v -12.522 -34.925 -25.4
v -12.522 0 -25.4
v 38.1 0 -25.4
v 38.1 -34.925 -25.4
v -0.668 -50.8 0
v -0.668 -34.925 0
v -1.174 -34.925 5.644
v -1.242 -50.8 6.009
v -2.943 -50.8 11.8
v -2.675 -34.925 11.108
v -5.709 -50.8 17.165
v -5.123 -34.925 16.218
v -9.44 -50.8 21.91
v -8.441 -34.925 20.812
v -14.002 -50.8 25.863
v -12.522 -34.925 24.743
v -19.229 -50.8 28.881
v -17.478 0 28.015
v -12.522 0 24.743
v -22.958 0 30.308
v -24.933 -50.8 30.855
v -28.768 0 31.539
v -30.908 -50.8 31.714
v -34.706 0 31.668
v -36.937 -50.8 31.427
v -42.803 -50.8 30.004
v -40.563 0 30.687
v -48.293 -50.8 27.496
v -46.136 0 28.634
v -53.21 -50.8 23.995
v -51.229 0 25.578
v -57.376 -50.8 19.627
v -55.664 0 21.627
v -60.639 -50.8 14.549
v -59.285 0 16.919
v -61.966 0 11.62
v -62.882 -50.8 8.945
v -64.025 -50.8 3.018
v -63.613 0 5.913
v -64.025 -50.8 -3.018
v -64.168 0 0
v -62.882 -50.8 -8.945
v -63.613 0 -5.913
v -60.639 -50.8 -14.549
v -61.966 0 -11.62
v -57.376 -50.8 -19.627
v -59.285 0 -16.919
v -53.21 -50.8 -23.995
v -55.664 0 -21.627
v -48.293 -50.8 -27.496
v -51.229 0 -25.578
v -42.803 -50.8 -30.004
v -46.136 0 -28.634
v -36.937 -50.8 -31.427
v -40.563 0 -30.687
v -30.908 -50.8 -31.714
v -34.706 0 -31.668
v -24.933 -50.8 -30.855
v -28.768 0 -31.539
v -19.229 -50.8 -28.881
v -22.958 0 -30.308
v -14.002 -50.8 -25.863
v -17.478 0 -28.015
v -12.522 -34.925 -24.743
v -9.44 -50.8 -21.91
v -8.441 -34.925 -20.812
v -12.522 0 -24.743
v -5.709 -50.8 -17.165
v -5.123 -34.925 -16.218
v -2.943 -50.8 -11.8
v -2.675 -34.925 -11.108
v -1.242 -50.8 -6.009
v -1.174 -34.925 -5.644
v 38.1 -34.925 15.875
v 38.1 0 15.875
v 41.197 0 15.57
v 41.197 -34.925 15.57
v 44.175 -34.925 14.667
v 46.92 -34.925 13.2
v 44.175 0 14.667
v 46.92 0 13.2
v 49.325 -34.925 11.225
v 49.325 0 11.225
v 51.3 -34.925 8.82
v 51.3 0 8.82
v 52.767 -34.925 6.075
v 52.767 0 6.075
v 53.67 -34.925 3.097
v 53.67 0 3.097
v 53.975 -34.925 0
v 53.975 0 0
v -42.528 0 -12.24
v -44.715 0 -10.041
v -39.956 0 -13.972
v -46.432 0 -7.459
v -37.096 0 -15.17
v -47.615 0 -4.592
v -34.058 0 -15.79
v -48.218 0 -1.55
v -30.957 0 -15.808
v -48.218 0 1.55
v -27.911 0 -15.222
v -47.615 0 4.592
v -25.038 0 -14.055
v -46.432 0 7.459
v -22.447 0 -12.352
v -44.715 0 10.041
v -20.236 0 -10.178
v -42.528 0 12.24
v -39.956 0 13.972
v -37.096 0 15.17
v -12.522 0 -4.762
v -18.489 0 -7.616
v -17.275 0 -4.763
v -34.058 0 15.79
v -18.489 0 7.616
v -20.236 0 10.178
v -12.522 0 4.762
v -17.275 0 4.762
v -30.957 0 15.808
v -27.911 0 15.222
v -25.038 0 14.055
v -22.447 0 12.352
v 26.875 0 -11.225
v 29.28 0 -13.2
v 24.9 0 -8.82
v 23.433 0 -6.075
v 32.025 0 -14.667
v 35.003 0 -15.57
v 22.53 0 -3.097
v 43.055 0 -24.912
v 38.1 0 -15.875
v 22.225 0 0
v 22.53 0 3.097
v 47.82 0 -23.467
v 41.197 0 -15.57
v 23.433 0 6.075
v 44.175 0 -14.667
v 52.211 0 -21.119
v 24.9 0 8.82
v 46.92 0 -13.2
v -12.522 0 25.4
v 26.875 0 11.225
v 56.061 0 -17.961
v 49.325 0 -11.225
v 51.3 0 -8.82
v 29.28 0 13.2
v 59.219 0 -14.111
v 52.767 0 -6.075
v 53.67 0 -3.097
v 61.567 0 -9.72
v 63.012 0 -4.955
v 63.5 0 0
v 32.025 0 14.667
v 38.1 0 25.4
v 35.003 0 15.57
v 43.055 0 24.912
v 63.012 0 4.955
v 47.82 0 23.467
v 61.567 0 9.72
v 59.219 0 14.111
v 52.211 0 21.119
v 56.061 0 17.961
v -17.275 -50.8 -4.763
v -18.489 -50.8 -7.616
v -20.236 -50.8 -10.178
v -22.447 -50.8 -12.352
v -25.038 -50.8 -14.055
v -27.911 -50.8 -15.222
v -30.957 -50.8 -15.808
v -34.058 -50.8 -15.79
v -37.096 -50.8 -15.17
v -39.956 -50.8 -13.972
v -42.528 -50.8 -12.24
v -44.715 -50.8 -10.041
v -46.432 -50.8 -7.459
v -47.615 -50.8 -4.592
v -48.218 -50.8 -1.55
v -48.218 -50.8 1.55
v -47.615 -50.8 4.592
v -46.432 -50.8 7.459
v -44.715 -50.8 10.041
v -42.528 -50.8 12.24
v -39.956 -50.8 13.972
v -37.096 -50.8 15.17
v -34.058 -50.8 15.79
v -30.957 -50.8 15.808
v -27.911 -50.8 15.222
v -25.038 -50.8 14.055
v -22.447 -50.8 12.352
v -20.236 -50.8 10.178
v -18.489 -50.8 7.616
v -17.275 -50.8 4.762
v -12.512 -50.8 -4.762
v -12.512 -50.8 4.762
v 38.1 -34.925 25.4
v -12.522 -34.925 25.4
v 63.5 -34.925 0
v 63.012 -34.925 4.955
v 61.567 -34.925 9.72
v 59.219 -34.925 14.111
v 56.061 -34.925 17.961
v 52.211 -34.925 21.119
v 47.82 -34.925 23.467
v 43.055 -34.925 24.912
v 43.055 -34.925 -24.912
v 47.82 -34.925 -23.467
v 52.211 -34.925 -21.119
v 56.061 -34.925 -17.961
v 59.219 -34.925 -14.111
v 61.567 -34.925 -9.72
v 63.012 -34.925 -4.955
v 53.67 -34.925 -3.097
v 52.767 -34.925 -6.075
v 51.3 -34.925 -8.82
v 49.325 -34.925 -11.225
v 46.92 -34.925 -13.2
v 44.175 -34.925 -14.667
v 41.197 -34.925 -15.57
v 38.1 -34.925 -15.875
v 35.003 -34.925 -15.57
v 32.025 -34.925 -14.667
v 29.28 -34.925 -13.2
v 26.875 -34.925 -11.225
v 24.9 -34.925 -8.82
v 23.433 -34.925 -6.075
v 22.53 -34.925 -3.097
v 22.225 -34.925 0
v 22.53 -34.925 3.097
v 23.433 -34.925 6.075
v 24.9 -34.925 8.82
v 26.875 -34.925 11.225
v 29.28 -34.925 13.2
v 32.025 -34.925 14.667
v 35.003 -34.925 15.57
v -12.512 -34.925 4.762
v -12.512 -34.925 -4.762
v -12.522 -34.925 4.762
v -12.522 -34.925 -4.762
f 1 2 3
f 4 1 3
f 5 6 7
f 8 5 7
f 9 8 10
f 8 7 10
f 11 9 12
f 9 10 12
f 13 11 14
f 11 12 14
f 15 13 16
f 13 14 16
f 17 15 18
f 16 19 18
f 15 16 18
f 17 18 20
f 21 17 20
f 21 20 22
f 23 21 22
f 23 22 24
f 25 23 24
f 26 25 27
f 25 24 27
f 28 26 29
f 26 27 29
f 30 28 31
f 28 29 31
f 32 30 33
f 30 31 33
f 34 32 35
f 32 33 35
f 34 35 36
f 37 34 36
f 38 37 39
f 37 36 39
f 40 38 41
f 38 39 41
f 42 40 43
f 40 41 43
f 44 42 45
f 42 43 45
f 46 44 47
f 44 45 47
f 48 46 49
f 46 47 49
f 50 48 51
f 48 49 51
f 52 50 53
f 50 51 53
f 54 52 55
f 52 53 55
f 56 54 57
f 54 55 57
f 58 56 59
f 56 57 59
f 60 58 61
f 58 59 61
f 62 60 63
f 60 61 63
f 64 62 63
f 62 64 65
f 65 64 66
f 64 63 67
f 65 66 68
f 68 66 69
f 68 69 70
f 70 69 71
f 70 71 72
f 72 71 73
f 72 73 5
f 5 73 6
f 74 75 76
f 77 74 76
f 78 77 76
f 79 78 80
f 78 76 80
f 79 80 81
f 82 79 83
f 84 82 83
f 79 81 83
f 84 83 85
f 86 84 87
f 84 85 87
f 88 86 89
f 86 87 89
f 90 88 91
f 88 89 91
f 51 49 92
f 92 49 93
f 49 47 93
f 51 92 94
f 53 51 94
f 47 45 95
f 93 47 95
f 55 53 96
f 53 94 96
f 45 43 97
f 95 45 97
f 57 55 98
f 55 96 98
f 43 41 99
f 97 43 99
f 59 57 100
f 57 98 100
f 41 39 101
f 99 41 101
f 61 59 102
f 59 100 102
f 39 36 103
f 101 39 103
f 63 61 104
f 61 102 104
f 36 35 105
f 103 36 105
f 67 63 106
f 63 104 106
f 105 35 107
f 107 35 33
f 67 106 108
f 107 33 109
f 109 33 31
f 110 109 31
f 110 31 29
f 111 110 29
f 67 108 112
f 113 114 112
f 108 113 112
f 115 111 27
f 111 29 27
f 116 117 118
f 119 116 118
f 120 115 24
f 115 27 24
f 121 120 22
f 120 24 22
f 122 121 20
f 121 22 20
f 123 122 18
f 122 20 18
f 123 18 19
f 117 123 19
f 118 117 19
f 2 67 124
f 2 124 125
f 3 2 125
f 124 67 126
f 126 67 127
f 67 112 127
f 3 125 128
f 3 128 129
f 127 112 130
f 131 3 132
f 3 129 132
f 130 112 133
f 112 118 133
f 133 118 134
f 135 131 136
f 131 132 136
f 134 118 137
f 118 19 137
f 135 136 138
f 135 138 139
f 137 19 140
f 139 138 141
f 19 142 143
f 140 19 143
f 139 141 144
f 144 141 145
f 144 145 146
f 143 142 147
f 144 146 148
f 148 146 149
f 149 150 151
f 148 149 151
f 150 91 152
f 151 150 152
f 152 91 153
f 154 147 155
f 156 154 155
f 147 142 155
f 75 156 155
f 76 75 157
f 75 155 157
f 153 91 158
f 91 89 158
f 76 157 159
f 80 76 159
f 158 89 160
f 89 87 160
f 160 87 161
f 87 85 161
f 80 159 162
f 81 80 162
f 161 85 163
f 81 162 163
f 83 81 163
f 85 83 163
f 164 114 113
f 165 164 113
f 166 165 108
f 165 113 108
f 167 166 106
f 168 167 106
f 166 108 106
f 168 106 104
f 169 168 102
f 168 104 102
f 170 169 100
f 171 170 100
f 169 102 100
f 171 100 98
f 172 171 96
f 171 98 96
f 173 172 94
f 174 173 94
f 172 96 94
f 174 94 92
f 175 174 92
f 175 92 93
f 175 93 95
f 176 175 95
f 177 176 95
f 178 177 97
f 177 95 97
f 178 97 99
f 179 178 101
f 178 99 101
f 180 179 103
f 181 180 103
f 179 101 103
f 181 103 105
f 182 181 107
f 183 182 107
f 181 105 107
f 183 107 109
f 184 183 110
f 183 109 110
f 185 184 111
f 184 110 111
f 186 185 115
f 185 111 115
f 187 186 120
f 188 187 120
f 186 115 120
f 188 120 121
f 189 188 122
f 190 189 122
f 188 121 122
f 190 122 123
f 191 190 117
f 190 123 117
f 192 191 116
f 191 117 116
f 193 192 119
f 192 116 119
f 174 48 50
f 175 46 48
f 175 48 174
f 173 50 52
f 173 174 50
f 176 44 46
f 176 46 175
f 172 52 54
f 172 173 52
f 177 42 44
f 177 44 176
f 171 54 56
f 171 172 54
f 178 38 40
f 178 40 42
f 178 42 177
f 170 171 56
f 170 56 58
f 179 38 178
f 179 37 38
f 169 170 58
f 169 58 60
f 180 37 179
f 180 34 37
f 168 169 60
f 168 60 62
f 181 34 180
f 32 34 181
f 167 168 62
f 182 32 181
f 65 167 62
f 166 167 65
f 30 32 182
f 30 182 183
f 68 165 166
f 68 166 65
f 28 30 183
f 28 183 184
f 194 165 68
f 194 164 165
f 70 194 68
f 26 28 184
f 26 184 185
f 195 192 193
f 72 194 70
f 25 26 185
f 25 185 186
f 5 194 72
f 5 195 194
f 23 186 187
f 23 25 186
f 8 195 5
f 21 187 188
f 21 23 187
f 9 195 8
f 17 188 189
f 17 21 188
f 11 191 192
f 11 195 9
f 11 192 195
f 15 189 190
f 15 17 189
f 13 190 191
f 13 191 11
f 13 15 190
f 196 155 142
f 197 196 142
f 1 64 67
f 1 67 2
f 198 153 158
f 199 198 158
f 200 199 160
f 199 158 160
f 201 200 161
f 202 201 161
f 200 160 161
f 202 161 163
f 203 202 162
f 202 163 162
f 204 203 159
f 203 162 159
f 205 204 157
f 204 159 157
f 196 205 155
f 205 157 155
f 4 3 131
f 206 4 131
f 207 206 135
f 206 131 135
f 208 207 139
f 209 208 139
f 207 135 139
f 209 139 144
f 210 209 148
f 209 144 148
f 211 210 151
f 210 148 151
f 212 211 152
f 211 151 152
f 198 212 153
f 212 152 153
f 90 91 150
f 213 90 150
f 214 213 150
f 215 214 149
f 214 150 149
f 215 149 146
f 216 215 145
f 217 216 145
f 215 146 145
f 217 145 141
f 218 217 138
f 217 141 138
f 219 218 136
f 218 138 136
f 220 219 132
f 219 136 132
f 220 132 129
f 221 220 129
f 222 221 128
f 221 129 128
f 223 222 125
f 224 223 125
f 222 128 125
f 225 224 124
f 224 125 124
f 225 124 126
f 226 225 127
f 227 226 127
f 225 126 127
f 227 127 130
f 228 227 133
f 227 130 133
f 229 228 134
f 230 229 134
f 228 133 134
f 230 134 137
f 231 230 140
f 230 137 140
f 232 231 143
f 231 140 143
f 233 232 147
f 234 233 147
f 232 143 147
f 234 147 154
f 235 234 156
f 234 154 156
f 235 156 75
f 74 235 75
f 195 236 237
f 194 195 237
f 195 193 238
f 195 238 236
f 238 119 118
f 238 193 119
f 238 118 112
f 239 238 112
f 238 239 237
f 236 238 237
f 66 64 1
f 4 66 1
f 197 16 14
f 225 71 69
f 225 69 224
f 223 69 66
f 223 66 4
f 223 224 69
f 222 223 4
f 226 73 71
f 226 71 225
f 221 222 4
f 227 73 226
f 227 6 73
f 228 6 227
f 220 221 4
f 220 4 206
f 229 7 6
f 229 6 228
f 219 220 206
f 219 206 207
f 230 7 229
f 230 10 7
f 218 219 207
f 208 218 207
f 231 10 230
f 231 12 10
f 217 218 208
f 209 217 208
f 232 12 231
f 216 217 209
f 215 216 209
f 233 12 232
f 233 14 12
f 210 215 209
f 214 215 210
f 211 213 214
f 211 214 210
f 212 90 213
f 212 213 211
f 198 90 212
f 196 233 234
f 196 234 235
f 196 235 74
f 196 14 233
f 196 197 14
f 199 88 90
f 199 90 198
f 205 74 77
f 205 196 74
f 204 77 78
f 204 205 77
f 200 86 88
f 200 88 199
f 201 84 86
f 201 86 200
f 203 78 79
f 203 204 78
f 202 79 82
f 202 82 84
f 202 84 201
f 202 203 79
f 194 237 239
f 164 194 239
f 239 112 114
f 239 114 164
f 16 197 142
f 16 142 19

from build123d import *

# Parameters (mm, degrees)
F1_DEPTH = 34.925
F2_R     = 31.75
F3_DEPTH = 50.8


with BuildPart() as f1:
    # F0 (on Front) → F1 (new body)
    with BuildSketch(Plane.XZ):
        with BuildLine():
            Line((38.1, 25.4), (-9.5485188067, 25.4))
            Line((-9.5485188067, 25.4), (-12.5222, 25.4))
            Line((-12.5222, 25.4), (-12.5222, -25.4))
            Line((-12.5222, -25.4), (-9.5485188067, -25.4))
            Line((-9.5485188067, -25.4), (38.1, -25.4))
            ThreePointArc((38.1, -25.4), (12.7, 0), (38.1, 25.4))
        make_face()
        with BuildLine():
            ThreePointArc((63.5, 0), (56.0605122421, 17.9605122421), (38.1, 25.4))
            Line((38.1, 25.4), (38.1, 15.875))
            ThreePointArc((38.1, 15.875), (49.3253201513, 11.2253201513), (53.975, 0))
            ThreePointArc((53.975, 0), (49.3253201513, -11.2253201513), (38.1, -15.875))
            Line((38.1, -15.875), (38.1, -25.4))
            ThreePointArc((38.1, -25.4), (56.0605122421, -17.9605122421), (63.5, 0))
        make_face()
        with BuildLine():
            Line((38.1, 15.875), (38.1, 25.4))
            ThreePointArc((38.1, 25.4), (12.7, 0), (38.1, -25.4))
            Line((38.1, -25.4), (38.1, -15.875))
            ThreePointArc((38.1, -15.875), (22.225, 0), (38.1, 15.875))
        make_face()
    extrude(amount=F1_DEPTH)

    # F2 (on Front) → F3 (join)
    with BuildSketch(Plane.XZ):
        with Locations((-32.41843798, 0)):
            Circle(F2_R)
        with BuildLine():
            ThreePointArc((-17.2746531575, -4.7625), (-48.29343798, 0), (-17.2746531575, 4.7625))
            Line((-17.2746531575, 4.7625), (-12.5121531575, 4.7625))
            Line((-12.5121531575, 4.7625), (-12.5121531575, -4.7625))
            Line((-12.5121531575, -4.7625), (-17.2746531575, -4.7625))
        make_face(mode=Mode.SUBTRACT)
    extrude(amount=F3_DEPTH)


solid = f1.part
